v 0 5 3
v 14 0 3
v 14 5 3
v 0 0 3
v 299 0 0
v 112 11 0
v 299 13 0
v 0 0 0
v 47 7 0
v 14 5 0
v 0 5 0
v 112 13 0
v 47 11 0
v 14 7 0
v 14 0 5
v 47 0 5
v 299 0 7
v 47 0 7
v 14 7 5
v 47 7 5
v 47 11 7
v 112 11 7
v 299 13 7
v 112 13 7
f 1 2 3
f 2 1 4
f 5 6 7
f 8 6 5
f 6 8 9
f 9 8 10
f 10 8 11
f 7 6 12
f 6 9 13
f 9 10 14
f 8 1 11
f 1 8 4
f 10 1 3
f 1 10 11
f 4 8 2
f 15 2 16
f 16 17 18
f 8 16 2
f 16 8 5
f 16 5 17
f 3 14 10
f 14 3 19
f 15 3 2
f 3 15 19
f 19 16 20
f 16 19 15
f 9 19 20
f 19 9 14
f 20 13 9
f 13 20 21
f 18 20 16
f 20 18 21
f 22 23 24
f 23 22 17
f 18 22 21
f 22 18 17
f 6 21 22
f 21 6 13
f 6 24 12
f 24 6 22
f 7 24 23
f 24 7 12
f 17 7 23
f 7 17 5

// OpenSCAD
translate([1.0, 2.5, 1.5]) color([0.2428386899579852, 0.7548584132190378, 0.291059519145354]) cube([2, 5, 3], center=true);
translate([3.0, 2.5, 1.5]) color([0.4197853778540753, 0.04625567690264132, 0.13223381043380655]) cube([2, 5, 3], center=true);
translate([5.0, 2.5, 1.5]) color([0.020549620641776678, 0.0779211200935358, 0.07321114936486084]) cube([2, 5, 3], center=true);
translate([7.0, 2.5, 1.5]) color([0.42023170217414685, 0.5507771776374378, 0.740878819870922]) cube([2, 5, 3], center=true);
translate([9.0, 2.5, 1.5]) color([0.14228347384241602, 0.4221887461694188, 0.6369660374117204]) cube([2, 5, 3], center=true);
translate([11.0, 2.5, 1.5]) color([0.08455569481893255, 0.44481115514620384, 0.3692560392397978]) cube([2, 5, 3], center=true);
translate([13.0, 2.5, 1.5]) color([0.9489319289416618, 0.05785711390101722, 0.40862622118314806]) cube([2, 5, 3], center=true);
translate([15.5, 3.5, 2.5]) color([0.41722547979620506, 0.728180504599678, 0.3206710028745039]) cube([3, 7, 5], center=true);
translate([18.5, 3.5, 2.5]) color([0.20399027594623398, 0.2933116551663051, 0.4708875424493587]) cube([3, 7, 5], center=true);
translate([21.5, 3.5, 2.5]) color([0.9502683295716211, 0.7965170227633064, 0.2769702457797433]) cube([3, 7, 5], center=true);
translate([24.5, 3.5, 2.5]) color([0.5581815883930463, 0.6882003035685332, 0.7956571556821322]) cube([3, 7, 5], center=true);
translate([27.5, 3.5, 2.5]) color([0.4461643839498476, 0.398776905129706, 0.7676407428212785]) cube([3, 7, 5], center=true);
translate([30.5, 3.5, 2.5]) color([0.43171649556411207, 0.2479576688970051, 0.4534470315306477]) cube([3, 7, 5], center=true);
translate([33.5, 3.5, 2.5]) color([0.9371046462904561, 0.14256748821860132, 0.4624353545272121]) cube([3, 7, 5], center=true);
translate([36.5, 3.5, 2.5]) color([0.6373035243637815, 0.48328798826810027, 0.20363990437036994]) cube([3, 7, 5], center=true);
translate([39.5, 3.5, 2.5]) color([0.0018431606156659175, 0.698991711803439, 0.6187355180234525]) cube([3, 7, 5], center=true);
translate([42.5, 3.5, 2.5]) color([0.007776649435864202, 0.2985601210181208, 0.7686342595428415]) cube([3, 7, 5], center=true);
translate([45.5, 3.5, 2.5]) color([0.6289203785446209, 0.5452081159439722, 0.1562211098090489]) cube([3, 7, 5], center=true);
translate([49.5, 5.5, 3.5]) color([0.7062940429996885, 0.4714349217158037, 0.6781787462359636]) cube([5, 11, 7], center=true);
translate([54.5, 5.5, 3.5]) color([0.7600898367234922, 0.23236272144124515, 0.7619950130977117]) cube([5, 11, 7], center=true);
translate([59.5, 5.5, 3.5]) color([0.28008838468838926, 0.9840151371182455, 0.12083161078451865]) cube([5, 11, 7], center=true);
translate([64.5, 5.5, 3.5]) color([0.8837180187440564, 0.040547125043371324, 0.256575818348144]) cube([5, 11, 7], center=true);
translate([69.5, 5.5, 3.5]) color([0.5261019087624684, 0.5816161834445946, 0.3962349850280922]) cube([5, 11, 7], center=true);
translate([74.5, 5.5, 3.5]) color([0.10203172822707107, 0.2526080858247133, 0.28339650386048865]) cube([5, 11, 7], center=true);
translate([79.5, 5.5, 3.5]) color([0.7552228545587315, 0.9087743252220071, 0.5954099154864194]) cube([5, 11, 7], center=true);
translate([84.5, 5.5, 3.5]) color([0.03545096569102746, 0.7922364716417103, 0.30560393283991993]) cube([5, 11, 7], center=true);
translate([89.5, 5.5, 3.5]) color([0.33989040641624346, 0.5301854376454147, 0.24904704757555507]) cube([5, 11, 7], center=true);
translate([94.5, 5.5, 3.5]) color([0.9199780878573697, 0.1635547583408129, 0.41483040050373277]) cube([5, 11, 7], center=true);
translate([99.5, 5.5, 3.5]) color([0.2896919495072058, 0.5198341022016146, 0.5739818030823766]) cube([5, 11, 7], center=true);
translate([104.5, 5.5, 3.5]) color([0.6271396891048426, 0.5313758038379728, 0.4108045023355995]) cube([5, 11, 7], center=true);
translate([109.5, 5.5, 3.5]) color([0.634594012376466, 0.40341287658681757, 0.7785502590540477]) cube([5, 11, 7], center=true);
translate([117.5, 6.5, 3.5]) color([0.7881774252549901, 0.29225416811082217, 0.37180432355577453]) cube([11, 13, 7], center=true);
translate([128.5, 6.5, 3.5]) color([0.6288109059468862, 0.15706996711565713, 0.6970319309869248]) cube([11, 13, 7], center=true);
translate([139.5, 6.5, 3.5]) color([0.3814277529807131, 0.591062474757007, 0.1395330992312218]) cube([11, 13, 7], center=true);
translate([150.5, 6.5, 3.5]) color([0.6682583860975598, 0.3540578606136997, 0.4726655762072315]) cube([11, 13, 7], center=true);
translate([161.5, 6.5, 3.5]) color([0.4151074008495357, 0.47671524799509457, 0.6946956329164442]) cube([11, 13, 7], center=true);
translate([172.5, 6.5, 3.5]) color([0.31824017683207795, 0.6520544808985483, 0.060222107499701916]) cube([11, 13, 7], center=true);
translate([183.5, 6.5, 3.5]) color([0.3001851524622099, 0.7452096901500458, 0.05240587806206365]) cube([11, 13, 7], center=true);
translate([194.5, 6.5, 3.5]) color([0.6211421952822352, 0.025546799267838538, 0.4715288683099005]) cube([11, 13, 7], center=true);
translate([205.5, 6.5, 3.5]) color([0.8885450437134765, 0.010110093997603875, 0.5268280206539229]) cube([11, 13, 7], center=true);
translate([216.5, 6.5, 3.5]) color([0.06645682965886301, 0.8671097761494883, 0.6862965222396646]) cube([11, 13, 7], center=true);
translate([227.5, 6.5, 3.5]) color([0.7419538566814291, 0.669007579945888, 0.006423453698145676]) cube([11, 13, 7], center=true);
translate([238.5, 6.5, 3.5]) color([0.041177862257898545, 0.6208768040220466, 0.9996851255769114]) cube([11, 13, 7], center=true);
translate([249.5, 6.5, 3.5]) color([0.8731472390917929, 0.699685806725371, 0.7270999543422898]) cube([11, 13, 7], center=true);
translate([260.5, 6.5, 3.5]) color([0.2266870226016624, 0.751613934135812, 0.28792410486343756]) cube([11, 13, 7], center=true);
translate([271.5, 6.5, 3.5]) color([0.10546026702239297, 0.4608948954667579, 0.33019577252961807]) cube([11, 13, 7], center=true);
translate([282.5, 6.5, 3.5]) color([0.168255398651179, 0.42170989251140467, 0.8972009769638755]) cube([11, 13, 7], center=true);
translate([293.5, 6.5, 3.5]) color([0.4352702732981688, 0.4472918952497248, 0.708827757444238]) cube([11, 13, 7], center=true);
